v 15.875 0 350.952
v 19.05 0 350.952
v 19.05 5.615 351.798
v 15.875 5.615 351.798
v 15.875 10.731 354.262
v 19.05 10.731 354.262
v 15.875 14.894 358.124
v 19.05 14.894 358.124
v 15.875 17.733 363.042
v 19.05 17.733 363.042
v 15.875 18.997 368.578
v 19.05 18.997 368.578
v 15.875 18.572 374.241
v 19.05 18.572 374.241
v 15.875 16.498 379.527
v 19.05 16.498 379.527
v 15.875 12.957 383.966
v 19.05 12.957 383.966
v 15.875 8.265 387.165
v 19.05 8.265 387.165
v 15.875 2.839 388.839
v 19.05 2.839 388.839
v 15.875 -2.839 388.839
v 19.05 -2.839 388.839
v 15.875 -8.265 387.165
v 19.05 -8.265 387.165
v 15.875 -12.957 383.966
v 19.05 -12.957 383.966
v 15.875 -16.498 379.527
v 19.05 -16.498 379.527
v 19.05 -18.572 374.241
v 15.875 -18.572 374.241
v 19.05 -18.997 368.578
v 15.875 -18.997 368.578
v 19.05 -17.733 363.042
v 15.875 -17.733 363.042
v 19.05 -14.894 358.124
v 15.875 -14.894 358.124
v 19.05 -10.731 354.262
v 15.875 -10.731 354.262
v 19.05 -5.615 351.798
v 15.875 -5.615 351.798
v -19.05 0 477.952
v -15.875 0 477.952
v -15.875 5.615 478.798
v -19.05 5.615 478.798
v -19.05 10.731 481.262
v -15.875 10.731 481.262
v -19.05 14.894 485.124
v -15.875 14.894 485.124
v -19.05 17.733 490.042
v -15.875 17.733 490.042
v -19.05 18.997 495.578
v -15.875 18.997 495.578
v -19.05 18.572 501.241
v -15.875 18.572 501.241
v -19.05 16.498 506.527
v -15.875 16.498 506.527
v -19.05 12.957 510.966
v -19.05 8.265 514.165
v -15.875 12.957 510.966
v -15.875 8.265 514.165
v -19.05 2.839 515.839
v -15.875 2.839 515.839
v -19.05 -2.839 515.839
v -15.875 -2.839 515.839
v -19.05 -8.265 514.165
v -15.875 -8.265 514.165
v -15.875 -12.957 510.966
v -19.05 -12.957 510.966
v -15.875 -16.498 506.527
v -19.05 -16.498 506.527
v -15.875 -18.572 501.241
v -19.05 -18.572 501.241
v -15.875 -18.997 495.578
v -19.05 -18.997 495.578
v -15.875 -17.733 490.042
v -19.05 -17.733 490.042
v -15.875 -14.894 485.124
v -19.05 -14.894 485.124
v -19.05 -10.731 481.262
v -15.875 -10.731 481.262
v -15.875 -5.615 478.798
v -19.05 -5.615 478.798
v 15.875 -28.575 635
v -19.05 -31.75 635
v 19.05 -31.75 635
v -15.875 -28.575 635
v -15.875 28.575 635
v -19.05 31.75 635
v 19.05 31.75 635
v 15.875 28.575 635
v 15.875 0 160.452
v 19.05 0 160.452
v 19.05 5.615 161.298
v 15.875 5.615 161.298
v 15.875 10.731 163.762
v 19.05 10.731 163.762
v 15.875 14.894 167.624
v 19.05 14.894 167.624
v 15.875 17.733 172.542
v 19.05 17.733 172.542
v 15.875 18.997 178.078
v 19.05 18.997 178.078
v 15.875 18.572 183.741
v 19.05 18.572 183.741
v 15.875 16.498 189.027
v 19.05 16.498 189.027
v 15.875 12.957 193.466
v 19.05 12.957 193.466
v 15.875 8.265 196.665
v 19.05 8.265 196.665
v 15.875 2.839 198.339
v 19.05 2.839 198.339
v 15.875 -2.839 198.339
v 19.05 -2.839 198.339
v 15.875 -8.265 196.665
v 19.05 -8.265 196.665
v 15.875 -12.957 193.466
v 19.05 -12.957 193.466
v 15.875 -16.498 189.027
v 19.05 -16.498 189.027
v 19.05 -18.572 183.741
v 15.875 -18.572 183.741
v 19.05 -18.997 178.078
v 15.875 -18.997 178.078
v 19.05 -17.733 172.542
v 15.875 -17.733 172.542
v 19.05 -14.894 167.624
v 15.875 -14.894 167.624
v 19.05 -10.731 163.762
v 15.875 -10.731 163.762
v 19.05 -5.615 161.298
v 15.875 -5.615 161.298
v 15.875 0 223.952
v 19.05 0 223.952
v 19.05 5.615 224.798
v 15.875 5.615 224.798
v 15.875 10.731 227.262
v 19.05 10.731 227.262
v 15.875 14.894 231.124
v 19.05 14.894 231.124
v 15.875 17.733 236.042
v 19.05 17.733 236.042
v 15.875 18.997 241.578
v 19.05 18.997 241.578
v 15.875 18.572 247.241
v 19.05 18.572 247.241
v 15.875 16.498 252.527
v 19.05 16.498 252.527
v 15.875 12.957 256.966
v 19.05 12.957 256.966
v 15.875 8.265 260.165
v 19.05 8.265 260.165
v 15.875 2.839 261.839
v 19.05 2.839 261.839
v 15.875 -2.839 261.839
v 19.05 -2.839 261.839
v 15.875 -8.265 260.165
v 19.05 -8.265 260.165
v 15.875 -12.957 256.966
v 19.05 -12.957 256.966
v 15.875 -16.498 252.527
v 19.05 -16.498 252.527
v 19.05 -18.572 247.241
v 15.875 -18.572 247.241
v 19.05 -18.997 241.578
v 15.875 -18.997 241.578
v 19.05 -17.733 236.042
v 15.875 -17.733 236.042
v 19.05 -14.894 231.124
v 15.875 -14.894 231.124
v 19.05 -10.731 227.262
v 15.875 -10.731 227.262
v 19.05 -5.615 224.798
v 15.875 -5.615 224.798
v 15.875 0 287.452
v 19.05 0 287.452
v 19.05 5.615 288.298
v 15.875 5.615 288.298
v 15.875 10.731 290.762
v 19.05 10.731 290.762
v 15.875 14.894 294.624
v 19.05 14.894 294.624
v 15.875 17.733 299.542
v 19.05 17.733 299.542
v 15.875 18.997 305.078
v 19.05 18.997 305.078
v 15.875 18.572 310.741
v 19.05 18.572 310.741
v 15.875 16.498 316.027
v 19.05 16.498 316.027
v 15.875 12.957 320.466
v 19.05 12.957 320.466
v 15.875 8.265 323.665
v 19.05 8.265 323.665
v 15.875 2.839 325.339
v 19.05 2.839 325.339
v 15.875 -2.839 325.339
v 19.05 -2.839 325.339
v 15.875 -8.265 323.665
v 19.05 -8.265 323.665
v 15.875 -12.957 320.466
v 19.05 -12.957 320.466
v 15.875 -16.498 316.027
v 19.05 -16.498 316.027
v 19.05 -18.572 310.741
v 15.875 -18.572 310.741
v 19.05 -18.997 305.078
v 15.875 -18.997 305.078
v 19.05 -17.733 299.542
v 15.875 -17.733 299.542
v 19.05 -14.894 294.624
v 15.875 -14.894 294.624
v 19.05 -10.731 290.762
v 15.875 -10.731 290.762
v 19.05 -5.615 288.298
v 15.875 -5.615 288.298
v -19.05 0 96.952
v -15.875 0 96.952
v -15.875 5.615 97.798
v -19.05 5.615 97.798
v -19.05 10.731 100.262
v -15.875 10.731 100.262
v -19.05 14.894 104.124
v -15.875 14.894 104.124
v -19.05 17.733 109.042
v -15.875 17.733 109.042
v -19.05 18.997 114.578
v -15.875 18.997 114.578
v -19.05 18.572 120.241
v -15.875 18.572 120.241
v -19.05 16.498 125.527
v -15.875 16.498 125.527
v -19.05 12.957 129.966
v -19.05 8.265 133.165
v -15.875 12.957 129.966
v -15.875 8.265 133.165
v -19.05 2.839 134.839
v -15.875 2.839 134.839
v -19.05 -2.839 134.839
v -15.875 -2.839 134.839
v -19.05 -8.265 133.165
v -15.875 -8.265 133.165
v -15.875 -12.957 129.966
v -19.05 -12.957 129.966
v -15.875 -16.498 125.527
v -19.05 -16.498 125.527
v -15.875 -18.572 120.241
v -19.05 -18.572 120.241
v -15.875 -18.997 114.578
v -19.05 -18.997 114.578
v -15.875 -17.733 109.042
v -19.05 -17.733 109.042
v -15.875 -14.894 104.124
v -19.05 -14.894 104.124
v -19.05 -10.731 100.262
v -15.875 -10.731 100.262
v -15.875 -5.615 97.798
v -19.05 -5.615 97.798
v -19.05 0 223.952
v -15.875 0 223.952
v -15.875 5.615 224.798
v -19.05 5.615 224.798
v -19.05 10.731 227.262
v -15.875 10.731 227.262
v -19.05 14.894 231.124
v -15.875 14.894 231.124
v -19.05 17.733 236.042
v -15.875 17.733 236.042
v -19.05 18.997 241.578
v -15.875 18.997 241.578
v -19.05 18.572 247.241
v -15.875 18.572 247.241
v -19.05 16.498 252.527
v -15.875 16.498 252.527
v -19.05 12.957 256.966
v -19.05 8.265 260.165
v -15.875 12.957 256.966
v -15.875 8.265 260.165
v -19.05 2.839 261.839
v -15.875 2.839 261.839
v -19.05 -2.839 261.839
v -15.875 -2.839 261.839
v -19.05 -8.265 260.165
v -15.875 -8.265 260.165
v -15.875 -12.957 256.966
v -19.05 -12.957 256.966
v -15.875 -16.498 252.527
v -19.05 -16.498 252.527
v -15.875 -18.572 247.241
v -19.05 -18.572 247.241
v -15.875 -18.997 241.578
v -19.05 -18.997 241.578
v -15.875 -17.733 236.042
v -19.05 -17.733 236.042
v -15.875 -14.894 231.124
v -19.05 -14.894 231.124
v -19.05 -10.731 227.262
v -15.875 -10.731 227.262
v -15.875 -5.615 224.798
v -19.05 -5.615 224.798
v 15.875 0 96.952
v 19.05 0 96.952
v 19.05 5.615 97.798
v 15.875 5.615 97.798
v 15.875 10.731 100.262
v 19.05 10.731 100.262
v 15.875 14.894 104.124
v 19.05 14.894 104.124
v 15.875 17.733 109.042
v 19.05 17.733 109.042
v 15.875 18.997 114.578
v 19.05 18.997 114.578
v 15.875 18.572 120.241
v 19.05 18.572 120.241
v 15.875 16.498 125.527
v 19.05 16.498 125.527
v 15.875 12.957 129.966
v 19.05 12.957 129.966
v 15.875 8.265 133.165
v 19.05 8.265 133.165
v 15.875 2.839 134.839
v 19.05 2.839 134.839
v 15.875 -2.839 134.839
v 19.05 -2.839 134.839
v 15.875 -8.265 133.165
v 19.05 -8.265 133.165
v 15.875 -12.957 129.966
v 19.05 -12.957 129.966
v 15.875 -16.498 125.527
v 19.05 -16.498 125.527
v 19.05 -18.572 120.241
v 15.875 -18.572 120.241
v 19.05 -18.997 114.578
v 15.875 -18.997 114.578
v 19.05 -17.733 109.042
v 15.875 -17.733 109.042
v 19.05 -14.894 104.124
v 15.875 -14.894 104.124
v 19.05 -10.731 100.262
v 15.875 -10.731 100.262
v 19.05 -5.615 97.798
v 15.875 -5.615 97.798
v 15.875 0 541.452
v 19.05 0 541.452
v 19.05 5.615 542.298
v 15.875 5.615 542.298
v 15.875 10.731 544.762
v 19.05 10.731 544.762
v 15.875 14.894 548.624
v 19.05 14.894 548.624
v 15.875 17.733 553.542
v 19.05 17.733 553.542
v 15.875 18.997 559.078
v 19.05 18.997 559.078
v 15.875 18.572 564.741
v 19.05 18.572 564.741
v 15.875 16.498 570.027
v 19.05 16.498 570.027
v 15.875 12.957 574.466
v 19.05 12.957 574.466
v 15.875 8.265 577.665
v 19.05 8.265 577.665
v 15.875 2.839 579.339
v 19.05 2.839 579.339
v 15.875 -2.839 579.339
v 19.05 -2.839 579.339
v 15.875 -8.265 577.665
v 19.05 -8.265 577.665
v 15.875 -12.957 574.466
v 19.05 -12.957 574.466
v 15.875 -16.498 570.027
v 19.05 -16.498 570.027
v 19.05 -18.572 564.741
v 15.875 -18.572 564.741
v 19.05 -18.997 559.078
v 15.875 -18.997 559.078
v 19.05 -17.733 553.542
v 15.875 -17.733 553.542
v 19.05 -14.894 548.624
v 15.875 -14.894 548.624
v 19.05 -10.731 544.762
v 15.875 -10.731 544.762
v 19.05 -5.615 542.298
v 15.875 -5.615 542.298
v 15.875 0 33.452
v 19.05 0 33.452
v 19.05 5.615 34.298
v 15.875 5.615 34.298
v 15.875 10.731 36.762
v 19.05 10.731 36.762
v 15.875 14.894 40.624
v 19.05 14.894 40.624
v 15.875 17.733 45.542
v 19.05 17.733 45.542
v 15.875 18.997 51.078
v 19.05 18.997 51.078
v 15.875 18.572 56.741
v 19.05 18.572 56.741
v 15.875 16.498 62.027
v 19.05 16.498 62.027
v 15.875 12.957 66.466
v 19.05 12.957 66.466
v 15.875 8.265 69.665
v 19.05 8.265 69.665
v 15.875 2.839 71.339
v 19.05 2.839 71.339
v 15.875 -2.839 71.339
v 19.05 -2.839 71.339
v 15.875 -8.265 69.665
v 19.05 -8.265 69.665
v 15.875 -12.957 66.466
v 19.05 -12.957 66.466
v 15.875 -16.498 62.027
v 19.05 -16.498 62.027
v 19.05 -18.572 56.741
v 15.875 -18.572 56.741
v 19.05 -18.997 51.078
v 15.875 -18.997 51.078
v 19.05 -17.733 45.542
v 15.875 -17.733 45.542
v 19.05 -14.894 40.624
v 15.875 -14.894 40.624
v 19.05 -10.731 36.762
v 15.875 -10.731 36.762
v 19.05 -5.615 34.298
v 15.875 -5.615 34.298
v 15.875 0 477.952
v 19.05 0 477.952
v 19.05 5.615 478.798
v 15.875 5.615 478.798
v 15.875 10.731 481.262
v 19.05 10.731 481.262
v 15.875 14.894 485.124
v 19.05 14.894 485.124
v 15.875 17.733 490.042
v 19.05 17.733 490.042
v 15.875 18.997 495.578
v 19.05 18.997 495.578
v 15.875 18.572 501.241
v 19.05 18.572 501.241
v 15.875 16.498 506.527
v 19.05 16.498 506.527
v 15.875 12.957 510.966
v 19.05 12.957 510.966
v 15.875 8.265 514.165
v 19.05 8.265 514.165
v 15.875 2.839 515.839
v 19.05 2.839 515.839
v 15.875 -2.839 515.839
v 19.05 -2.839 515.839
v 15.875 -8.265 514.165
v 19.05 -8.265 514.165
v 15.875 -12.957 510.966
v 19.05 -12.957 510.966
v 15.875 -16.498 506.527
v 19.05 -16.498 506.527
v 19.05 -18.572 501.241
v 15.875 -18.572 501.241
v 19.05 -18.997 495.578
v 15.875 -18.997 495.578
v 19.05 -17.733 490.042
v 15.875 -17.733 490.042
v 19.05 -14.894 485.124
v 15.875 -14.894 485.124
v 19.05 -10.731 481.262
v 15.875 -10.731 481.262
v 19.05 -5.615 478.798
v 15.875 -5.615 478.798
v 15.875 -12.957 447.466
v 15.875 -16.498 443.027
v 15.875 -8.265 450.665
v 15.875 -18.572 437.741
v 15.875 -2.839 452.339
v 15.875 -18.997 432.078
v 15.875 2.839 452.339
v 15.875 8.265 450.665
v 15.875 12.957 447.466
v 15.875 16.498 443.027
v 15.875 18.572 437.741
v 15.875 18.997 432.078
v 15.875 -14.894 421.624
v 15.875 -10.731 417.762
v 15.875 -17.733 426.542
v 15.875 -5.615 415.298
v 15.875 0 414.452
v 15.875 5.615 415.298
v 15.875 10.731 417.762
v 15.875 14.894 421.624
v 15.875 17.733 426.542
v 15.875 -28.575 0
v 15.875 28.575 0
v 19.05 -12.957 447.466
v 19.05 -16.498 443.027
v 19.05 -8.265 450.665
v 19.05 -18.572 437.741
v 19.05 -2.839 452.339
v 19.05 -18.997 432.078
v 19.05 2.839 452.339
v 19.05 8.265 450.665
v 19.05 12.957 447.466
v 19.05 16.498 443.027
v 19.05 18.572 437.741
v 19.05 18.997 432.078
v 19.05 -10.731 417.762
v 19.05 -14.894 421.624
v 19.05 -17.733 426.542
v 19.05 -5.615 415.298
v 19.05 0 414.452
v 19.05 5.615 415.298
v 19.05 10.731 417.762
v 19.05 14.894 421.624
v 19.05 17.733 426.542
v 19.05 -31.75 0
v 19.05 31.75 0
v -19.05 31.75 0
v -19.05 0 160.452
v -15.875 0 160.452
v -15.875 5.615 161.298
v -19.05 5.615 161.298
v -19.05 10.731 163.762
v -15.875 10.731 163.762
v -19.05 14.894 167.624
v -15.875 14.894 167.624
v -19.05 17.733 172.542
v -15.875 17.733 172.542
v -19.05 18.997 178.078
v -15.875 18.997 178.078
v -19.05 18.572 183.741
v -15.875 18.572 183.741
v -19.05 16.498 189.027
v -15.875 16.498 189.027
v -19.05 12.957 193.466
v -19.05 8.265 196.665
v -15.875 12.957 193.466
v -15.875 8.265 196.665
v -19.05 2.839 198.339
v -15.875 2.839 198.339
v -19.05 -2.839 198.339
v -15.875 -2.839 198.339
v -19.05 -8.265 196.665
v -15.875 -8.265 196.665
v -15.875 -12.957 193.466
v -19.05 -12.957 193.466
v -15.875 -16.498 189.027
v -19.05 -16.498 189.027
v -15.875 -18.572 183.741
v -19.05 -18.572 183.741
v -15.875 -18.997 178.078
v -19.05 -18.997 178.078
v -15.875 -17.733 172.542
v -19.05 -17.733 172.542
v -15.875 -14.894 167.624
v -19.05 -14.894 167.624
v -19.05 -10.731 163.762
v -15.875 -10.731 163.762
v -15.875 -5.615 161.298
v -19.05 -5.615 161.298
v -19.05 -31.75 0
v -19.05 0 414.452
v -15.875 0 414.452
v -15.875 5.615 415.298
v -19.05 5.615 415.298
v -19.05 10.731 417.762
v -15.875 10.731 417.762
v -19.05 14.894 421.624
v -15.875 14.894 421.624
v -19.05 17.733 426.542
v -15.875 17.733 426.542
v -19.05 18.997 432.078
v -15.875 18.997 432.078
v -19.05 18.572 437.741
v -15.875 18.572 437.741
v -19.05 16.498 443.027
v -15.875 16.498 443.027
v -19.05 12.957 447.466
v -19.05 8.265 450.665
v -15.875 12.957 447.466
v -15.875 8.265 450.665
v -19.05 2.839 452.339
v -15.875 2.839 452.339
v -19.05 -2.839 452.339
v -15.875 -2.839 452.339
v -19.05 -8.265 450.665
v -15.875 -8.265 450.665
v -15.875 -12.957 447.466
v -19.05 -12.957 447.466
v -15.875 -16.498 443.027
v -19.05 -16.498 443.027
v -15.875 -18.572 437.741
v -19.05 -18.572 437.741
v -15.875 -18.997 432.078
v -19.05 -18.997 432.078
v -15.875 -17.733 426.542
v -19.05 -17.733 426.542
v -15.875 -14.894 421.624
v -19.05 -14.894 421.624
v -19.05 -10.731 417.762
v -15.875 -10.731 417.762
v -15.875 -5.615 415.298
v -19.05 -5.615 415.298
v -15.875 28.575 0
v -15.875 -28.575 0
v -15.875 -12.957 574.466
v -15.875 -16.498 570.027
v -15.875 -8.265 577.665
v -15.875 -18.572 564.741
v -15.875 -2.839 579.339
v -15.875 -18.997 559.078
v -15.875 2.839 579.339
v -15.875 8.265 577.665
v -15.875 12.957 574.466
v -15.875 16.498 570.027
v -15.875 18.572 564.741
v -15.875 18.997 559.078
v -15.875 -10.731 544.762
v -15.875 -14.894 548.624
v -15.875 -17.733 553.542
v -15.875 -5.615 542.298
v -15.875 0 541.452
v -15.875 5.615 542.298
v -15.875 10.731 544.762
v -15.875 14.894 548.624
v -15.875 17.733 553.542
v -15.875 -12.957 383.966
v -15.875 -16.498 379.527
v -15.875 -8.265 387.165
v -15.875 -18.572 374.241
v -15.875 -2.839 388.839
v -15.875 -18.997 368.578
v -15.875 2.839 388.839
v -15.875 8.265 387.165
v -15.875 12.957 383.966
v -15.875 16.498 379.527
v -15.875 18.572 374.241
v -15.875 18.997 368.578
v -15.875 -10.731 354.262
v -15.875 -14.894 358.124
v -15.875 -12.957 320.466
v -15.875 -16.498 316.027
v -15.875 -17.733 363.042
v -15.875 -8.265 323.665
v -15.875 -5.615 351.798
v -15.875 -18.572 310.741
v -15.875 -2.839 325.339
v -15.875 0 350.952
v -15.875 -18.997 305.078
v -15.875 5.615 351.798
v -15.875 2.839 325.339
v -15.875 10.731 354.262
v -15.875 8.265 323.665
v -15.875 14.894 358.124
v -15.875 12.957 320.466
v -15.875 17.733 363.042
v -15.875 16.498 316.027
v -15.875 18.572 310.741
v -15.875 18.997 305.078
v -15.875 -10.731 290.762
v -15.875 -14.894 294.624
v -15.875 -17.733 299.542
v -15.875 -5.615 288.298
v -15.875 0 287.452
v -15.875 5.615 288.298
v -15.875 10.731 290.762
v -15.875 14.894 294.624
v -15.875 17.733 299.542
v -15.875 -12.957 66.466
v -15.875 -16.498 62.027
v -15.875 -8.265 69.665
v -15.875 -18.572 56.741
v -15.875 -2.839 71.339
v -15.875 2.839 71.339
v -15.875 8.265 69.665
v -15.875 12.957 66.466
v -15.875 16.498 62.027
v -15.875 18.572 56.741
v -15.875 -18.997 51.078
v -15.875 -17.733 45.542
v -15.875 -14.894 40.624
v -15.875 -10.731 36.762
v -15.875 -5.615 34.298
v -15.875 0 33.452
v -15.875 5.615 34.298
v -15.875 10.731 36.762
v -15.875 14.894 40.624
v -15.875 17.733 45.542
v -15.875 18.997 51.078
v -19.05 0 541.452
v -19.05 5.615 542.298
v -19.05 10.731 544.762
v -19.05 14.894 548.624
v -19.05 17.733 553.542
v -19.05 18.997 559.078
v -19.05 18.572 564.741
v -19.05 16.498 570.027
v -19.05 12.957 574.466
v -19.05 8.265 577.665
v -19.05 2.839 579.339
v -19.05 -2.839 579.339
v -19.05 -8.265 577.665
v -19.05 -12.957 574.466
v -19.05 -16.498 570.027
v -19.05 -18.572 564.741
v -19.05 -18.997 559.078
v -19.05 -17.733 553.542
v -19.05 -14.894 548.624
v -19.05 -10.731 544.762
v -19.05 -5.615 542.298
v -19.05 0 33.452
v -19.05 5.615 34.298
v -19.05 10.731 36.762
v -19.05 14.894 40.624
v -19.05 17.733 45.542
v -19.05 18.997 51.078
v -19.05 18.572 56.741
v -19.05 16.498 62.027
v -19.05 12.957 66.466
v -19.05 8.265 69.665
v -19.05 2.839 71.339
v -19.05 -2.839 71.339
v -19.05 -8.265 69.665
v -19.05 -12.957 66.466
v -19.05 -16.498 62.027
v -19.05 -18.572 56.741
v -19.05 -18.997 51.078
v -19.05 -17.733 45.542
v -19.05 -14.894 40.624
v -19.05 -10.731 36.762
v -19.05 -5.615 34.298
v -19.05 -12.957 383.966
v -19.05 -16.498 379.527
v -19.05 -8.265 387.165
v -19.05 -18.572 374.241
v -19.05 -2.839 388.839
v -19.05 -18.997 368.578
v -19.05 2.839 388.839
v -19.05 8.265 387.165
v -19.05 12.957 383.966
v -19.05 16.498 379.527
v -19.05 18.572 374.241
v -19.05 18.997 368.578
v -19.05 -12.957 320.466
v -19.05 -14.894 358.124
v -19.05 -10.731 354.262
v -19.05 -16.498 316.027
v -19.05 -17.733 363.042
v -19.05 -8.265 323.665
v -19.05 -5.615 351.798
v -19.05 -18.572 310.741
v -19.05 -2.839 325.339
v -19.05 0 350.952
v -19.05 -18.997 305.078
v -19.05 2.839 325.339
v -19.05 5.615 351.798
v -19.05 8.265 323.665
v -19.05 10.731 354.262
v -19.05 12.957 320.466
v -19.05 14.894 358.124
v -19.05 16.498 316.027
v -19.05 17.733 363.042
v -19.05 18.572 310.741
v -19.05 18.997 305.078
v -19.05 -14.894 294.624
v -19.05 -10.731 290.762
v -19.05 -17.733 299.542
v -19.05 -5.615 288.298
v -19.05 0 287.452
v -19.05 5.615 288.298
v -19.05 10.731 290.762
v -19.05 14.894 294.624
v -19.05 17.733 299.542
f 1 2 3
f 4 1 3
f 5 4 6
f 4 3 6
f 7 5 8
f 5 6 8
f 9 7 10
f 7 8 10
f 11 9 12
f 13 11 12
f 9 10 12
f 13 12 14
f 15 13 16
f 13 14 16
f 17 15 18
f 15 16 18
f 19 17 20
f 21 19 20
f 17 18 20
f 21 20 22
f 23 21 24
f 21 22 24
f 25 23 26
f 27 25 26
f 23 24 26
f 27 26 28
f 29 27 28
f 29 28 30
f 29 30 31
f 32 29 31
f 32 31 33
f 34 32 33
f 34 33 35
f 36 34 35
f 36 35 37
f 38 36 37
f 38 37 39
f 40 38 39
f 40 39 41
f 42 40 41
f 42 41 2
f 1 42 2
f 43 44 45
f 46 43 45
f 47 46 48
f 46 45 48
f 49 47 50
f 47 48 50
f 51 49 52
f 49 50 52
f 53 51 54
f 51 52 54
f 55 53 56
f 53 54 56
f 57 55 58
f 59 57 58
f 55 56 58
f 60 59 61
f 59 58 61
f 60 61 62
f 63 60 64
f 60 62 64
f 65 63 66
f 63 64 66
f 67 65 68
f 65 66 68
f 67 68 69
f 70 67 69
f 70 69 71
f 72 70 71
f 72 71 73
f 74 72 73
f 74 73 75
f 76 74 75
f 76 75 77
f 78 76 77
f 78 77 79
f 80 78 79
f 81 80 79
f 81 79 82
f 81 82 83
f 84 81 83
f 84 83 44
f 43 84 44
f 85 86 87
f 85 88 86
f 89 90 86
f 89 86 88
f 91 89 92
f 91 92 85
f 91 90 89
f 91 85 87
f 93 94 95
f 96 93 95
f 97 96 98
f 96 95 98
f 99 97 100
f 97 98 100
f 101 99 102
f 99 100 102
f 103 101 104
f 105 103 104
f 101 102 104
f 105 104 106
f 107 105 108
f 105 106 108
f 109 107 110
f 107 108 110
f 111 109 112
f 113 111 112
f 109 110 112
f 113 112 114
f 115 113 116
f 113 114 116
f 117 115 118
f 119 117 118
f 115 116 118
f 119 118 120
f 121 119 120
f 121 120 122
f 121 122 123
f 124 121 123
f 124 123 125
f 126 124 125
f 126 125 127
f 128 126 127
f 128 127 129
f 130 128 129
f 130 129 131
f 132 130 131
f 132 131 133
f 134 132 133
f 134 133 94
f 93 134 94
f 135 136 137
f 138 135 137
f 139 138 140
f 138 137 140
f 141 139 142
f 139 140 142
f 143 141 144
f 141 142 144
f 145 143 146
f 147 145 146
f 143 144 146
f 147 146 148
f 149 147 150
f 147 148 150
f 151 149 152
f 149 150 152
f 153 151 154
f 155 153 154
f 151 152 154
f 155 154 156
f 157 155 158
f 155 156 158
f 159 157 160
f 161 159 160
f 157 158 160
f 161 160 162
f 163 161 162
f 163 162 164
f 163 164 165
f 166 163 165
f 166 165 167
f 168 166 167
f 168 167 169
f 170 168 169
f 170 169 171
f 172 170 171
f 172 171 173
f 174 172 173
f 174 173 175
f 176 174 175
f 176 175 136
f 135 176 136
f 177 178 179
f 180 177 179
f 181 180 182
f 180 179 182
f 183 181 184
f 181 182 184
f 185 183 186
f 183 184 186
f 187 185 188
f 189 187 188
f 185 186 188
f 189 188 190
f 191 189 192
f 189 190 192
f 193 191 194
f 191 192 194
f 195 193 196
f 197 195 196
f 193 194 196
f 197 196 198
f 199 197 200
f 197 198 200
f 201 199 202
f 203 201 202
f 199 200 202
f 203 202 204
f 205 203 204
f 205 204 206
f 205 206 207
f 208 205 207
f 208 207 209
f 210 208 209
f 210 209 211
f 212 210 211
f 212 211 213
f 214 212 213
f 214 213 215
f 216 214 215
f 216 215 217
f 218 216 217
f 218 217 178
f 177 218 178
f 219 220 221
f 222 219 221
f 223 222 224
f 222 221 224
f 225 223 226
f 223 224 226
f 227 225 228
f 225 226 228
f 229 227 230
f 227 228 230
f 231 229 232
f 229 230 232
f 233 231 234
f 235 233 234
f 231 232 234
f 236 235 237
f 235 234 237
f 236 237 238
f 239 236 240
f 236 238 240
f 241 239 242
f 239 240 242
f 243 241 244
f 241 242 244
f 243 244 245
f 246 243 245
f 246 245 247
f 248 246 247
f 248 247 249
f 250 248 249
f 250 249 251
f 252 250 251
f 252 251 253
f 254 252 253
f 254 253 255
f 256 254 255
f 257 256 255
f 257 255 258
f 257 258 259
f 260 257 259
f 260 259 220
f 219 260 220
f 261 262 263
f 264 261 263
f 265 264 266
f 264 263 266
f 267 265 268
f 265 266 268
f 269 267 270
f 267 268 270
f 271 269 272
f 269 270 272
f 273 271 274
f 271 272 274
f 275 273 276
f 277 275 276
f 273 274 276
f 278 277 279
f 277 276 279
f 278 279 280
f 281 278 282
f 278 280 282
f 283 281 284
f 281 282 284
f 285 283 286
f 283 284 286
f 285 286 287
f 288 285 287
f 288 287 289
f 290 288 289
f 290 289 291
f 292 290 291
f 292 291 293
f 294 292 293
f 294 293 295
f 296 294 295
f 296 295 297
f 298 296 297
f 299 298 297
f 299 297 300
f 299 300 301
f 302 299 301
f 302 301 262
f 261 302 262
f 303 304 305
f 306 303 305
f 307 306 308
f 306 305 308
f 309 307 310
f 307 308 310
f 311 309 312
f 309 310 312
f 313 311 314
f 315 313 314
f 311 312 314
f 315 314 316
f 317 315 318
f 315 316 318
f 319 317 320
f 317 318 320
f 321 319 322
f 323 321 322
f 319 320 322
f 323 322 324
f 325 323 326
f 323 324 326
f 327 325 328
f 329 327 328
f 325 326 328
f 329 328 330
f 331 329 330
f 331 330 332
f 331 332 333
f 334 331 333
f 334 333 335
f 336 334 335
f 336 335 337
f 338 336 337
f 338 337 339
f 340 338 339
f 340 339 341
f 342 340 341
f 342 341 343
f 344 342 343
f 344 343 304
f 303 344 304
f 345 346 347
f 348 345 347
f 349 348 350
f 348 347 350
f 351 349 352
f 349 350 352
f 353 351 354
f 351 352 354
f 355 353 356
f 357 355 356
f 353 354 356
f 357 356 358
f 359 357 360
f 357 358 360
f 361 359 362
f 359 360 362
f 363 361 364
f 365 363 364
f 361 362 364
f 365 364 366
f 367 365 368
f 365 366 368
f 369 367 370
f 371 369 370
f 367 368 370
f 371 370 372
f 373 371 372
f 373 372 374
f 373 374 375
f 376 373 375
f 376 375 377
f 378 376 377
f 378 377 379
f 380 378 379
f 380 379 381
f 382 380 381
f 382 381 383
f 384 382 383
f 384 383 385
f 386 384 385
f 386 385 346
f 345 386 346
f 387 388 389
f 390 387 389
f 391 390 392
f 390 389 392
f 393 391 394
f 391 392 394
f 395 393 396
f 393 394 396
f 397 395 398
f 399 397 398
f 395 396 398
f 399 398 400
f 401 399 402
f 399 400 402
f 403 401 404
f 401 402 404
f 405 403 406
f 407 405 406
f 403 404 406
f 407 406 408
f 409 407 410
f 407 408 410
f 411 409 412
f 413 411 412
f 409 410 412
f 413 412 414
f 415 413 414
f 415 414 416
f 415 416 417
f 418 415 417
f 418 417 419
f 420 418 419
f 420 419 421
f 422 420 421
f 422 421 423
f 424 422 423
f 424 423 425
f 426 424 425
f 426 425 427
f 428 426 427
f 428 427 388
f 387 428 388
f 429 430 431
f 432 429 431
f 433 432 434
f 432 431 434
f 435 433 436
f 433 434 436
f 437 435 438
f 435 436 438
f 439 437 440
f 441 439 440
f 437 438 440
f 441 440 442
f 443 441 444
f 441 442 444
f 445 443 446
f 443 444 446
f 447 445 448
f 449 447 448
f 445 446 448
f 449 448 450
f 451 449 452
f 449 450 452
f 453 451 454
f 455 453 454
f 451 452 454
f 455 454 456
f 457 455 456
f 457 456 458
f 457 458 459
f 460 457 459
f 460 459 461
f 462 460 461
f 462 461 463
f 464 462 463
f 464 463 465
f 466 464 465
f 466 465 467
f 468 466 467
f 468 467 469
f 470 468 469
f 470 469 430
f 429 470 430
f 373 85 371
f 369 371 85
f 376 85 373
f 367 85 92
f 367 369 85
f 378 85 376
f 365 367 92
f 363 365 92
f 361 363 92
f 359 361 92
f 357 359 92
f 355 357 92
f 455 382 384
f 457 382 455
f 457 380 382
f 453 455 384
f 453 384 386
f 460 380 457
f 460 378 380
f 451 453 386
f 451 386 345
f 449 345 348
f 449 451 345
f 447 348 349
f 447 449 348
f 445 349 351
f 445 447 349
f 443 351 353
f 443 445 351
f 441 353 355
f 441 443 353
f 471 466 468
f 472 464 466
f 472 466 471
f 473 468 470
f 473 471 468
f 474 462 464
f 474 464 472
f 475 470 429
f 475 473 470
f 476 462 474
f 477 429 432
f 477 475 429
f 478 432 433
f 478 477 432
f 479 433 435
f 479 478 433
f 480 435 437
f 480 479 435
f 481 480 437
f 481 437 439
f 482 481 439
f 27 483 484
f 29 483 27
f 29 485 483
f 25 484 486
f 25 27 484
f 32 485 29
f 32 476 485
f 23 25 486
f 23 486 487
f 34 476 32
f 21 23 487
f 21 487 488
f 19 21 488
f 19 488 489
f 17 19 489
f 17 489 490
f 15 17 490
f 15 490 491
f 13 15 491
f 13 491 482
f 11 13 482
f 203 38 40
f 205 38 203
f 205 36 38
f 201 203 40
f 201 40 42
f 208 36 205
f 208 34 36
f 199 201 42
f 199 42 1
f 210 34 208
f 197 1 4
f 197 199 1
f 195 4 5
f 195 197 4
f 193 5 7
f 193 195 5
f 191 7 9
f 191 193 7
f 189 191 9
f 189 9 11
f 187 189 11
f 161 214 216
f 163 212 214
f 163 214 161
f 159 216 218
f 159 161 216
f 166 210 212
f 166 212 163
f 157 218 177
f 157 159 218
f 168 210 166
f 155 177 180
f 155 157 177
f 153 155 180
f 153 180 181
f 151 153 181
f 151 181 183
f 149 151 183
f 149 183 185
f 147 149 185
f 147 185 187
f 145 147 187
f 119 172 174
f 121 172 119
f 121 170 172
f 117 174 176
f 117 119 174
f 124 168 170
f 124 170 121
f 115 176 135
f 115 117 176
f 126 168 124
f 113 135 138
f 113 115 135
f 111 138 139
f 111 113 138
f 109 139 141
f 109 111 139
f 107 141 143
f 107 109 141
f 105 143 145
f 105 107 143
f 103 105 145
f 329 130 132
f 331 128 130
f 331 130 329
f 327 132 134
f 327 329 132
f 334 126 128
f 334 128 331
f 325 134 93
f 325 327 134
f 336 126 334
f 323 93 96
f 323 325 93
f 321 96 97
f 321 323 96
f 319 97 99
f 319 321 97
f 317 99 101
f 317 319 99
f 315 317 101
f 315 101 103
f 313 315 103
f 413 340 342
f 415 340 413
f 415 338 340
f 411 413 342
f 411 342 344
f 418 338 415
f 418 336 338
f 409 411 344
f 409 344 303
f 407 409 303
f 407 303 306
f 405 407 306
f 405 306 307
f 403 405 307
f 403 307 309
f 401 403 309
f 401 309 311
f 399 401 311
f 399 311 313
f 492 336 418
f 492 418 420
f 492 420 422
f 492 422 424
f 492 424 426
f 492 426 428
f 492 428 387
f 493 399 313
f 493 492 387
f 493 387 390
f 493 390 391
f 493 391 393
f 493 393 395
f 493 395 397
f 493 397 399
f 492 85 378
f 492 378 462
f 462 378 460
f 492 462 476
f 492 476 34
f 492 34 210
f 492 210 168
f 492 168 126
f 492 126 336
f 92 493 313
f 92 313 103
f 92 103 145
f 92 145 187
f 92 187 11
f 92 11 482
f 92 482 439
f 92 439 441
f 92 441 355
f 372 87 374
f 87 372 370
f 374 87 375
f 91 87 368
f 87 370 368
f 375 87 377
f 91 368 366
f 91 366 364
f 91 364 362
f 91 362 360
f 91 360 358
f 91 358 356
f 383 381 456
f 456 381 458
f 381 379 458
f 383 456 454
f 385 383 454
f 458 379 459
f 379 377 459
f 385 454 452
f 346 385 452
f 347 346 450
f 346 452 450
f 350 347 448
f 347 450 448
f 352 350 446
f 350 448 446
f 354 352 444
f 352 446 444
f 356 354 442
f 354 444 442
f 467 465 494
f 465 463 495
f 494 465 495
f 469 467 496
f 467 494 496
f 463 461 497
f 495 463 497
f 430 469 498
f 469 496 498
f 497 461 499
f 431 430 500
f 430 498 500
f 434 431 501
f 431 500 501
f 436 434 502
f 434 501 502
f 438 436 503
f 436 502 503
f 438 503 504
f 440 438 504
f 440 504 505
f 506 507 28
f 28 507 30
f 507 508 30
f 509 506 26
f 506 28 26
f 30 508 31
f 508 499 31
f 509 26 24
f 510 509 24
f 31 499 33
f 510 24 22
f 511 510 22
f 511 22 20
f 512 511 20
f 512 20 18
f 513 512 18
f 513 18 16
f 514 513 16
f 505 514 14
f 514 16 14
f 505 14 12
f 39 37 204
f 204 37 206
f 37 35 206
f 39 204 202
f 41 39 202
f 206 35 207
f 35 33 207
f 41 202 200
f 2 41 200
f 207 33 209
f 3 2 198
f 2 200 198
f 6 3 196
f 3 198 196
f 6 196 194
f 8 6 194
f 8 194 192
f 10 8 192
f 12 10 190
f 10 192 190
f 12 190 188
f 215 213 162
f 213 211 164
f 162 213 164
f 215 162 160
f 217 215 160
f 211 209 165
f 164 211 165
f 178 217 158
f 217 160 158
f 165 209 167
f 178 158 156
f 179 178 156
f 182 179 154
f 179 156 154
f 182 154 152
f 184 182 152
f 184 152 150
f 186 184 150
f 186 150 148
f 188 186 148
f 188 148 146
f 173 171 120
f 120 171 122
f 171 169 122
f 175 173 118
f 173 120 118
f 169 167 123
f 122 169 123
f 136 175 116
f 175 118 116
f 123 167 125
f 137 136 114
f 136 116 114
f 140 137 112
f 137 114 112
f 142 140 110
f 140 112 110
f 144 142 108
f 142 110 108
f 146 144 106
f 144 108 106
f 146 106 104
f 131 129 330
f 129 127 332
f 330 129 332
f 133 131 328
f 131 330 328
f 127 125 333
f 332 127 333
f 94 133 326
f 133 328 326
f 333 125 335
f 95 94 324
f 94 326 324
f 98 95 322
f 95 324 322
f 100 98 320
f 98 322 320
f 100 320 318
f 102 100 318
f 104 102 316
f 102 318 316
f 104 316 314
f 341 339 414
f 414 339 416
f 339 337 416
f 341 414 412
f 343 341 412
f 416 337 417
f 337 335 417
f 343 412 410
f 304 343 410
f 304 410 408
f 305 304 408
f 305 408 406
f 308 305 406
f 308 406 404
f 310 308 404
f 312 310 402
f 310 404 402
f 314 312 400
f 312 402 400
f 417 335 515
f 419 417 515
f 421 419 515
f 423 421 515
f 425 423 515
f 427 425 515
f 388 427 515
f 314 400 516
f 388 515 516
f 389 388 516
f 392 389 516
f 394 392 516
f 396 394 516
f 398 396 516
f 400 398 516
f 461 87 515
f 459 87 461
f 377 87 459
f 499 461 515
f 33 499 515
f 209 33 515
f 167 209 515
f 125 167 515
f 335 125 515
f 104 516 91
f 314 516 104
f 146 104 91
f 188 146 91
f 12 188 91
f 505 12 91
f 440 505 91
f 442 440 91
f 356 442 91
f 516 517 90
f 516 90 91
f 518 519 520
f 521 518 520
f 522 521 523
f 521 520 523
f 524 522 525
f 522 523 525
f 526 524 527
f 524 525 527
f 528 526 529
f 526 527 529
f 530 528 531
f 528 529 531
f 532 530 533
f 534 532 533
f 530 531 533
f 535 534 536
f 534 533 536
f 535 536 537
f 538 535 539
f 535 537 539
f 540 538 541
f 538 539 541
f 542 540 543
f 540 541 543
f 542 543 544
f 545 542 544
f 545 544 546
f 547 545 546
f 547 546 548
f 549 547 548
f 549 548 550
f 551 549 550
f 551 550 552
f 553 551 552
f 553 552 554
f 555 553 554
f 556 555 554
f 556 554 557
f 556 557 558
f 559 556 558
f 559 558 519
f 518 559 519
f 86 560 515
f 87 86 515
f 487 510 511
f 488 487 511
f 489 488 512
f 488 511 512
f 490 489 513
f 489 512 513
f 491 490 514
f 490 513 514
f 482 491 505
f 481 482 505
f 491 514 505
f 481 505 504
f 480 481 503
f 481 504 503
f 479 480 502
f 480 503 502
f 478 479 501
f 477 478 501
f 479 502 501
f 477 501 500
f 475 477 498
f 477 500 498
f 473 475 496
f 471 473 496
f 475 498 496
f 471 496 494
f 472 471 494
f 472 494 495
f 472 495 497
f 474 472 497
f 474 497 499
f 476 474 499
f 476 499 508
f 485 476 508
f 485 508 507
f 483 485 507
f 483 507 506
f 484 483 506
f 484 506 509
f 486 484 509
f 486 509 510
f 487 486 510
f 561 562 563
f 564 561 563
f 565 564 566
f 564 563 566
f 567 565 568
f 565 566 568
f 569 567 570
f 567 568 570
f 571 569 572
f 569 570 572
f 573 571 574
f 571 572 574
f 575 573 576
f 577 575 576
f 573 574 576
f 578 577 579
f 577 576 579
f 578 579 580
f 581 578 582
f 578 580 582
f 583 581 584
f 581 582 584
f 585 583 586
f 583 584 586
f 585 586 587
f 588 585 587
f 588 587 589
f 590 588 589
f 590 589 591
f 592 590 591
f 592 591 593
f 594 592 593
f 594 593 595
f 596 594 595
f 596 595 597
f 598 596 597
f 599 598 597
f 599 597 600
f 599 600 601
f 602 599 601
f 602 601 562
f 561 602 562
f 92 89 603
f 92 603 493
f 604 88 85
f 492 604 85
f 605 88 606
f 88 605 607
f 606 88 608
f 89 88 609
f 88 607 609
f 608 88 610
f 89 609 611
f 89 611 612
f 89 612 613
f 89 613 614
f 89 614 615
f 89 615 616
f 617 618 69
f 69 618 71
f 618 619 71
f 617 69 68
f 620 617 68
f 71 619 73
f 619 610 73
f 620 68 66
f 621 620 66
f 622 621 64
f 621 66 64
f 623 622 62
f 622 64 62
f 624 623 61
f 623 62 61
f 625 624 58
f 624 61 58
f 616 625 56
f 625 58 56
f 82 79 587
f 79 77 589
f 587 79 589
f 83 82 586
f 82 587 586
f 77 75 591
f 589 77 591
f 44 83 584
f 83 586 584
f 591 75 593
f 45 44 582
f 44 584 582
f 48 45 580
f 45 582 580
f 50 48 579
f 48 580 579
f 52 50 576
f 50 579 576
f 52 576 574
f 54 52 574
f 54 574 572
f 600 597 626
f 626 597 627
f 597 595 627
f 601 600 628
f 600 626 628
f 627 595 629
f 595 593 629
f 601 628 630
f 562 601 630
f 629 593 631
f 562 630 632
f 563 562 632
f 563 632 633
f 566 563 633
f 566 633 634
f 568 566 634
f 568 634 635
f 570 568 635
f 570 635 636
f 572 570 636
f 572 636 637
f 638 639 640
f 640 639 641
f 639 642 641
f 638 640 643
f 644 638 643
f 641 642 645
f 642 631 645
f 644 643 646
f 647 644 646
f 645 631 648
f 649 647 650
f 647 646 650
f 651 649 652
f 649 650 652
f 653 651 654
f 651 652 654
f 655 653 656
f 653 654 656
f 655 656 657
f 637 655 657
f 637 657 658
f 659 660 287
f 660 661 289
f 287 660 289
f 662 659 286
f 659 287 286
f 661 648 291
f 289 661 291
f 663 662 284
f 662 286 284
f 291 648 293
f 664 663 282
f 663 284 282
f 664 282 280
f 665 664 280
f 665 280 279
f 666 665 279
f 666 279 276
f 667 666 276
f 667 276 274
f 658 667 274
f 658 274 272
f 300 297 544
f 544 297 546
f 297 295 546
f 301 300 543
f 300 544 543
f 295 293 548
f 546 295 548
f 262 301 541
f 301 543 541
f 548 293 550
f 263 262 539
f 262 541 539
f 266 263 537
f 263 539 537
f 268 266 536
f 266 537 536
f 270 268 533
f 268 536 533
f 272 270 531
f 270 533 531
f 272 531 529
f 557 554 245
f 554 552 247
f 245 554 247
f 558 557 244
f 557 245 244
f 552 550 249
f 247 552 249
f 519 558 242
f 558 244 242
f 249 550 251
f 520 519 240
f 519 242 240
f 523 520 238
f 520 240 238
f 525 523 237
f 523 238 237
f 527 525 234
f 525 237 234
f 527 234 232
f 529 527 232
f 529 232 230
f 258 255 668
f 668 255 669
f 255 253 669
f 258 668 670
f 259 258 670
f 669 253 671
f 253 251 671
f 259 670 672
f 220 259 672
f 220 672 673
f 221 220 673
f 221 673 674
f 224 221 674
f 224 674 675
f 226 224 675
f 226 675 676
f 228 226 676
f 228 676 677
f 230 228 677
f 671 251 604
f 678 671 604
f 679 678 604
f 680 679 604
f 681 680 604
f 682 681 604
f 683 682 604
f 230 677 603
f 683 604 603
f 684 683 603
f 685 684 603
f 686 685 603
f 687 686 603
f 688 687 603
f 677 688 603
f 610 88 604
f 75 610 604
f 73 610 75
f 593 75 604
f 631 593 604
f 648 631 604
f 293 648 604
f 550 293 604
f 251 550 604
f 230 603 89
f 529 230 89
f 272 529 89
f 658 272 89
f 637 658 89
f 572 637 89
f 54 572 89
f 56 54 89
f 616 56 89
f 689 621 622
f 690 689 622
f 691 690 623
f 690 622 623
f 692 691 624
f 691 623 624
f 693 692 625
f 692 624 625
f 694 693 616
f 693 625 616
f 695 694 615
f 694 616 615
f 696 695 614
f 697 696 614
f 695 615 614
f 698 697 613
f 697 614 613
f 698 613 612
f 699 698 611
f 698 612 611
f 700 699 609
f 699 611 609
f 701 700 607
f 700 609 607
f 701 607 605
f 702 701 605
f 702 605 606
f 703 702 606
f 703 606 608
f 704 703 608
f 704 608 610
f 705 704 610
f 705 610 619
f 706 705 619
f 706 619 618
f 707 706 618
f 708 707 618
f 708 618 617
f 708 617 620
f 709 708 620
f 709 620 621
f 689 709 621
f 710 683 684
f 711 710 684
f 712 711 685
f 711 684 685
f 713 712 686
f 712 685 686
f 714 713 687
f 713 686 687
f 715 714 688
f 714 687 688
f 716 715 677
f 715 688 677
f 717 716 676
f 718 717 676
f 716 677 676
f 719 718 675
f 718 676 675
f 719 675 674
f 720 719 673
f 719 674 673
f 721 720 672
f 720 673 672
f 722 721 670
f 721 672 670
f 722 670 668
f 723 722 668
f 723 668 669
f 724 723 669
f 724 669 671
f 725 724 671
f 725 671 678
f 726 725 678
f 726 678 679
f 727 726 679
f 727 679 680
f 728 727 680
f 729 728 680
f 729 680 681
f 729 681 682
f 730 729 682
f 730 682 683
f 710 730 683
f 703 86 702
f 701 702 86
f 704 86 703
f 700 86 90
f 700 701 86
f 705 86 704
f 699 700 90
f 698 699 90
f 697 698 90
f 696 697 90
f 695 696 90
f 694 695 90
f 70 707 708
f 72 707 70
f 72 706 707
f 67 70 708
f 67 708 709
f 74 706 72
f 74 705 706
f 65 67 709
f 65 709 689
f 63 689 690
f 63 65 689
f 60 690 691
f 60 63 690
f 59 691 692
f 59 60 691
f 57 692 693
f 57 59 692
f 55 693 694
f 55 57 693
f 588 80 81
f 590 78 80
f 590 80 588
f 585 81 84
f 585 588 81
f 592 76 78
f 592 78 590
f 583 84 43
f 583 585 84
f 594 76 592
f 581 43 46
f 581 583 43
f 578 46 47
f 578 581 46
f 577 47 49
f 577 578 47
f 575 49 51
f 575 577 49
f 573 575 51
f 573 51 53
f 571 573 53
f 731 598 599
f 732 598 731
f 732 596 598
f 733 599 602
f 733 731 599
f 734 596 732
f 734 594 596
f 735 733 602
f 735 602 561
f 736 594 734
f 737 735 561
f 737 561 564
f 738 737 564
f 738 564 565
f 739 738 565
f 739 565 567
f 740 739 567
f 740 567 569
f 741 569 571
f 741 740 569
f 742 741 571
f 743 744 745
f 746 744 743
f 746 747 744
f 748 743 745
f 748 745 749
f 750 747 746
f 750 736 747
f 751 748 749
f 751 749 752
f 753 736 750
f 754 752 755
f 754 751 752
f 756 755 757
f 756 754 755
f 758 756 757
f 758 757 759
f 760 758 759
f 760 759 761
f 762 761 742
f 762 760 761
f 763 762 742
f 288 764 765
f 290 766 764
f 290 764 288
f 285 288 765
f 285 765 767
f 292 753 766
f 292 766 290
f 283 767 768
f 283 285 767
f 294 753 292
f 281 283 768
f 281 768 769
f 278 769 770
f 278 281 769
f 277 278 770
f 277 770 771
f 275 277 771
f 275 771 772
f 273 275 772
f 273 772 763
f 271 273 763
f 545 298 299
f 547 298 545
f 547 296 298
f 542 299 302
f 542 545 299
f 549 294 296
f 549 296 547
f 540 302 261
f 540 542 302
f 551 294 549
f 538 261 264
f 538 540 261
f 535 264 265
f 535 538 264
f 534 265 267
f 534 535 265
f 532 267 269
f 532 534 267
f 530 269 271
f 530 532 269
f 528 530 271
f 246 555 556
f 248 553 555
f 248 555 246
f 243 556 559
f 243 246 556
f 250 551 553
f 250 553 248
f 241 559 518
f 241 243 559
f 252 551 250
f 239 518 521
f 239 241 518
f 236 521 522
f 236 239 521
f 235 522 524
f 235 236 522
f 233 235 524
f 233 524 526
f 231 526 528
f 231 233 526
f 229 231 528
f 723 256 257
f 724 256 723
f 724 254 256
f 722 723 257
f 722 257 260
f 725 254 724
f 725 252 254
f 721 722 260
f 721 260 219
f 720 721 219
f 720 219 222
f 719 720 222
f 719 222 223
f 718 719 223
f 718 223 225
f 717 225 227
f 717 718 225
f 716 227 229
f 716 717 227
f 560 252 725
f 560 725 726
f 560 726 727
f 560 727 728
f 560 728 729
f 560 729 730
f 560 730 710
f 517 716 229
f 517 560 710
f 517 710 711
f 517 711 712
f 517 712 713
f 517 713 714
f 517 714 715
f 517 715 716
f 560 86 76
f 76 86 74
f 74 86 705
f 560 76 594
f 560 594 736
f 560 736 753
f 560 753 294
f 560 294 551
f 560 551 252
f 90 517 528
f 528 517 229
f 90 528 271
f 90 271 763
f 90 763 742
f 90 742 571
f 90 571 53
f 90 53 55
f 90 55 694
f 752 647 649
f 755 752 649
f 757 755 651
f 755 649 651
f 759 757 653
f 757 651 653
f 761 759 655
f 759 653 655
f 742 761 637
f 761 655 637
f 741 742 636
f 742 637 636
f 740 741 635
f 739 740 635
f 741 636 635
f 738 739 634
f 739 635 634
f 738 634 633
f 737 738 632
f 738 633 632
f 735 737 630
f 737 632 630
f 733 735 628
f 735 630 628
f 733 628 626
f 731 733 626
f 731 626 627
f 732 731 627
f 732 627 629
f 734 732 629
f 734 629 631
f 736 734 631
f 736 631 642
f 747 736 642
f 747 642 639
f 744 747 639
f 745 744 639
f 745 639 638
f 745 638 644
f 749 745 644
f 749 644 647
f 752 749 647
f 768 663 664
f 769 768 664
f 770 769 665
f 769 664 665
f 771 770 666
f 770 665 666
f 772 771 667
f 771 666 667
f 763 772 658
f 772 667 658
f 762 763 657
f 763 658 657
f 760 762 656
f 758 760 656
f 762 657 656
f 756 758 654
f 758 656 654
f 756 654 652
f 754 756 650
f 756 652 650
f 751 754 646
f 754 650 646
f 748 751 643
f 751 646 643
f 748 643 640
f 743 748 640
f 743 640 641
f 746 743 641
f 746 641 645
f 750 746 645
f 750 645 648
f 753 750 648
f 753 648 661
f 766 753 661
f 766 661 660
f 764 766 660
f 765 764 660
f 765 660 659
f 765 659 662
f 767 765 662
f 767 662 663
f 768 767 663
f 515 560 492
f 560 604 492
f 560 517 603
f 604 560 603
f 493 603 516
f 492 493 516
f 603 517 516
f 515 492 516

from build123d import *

# Parameters (mm, degrees)
SKETCH1_W           = 38.1
SKETCH1_H           = 63.5
SKETCH1_W_2         = 31.75
SKETCH1_H_2         = 57.15
BOSS_EXTRUDE1_DEPTH = 635
CUT_EXTRUDE1_REACH  = 638.934
SKETCH2_R           = 19.05


with BuildPart() as part:
    # Sketch1 → Boss-Extrude1 (new body)
    with BuildSketch(Plane.XY):
        Rectangle(SKETCH1_W, SKETCH1_H)
        Rectangle(SKETCH1_W_2, SKETCH1_H_2, mode=Mode.SUBTRACT)
    extrude(amount=BOSS_EXTRUDE1_DEPTH)

    # Cut-Extrude1: up to this face of the body (flat: up to its plane)
    cut_extrude1_end = Plane(part.part.faces().sort_by_distance((-19.05, 0, 317.5))[0])
    # Sketch2 → Cut-Extrude1 (cut, up to the picked face)
    with BuildSketch(Plane(origin=(19.05, 0, 0), x_dir=(0, 0, -1), z_dir=(1, 0, 0)), mode=Mode.PRIVATE) as cut_extrude1_sk1:
        with Locations((-560.5018, 0)):
            Circle(SKETCH2_R)
    cut_extrude1_tool1 = split(extrude(cut_extrude1_sk1.sketch, amount=-CUT_EXTRUDE1_REACH, mode=Mode.PRIVATE), bisect_by=cut_extrude1_end, keep=Keep.BOTH, mode=Mode.PRIVATE)
    # Sketch2 → Cut-Extrude1 (cut, up to the picked face)
    with BuildSketch(Plane(origin=(19.05, 0, 0), x_dir=(0, 0, -1), z_dir=(1, 0, 0)), mode=Mode.PRIVATE) as cut_extrude1_sk2:
        with Locations((-497.0018, 0)):
            Circle(SKETCH2_R)
    cut_extrude1_tool2 = split(extrude(cut_extrude1_sk2.sketch, amount=-CUT_EXTRUDE1_REACH, mode=Mode.PRIVATE), bisect_by=cut_extrude1_end, keep=Keep.BOTH, mode=Mode.PRIVATE)
    # Sketch2 → Cut-Extrude1 (cut, up to the picked face)
    with BuildSketch(Plane(origin=(19.05, 0, 0), x_dir=(0, 0, -1), z_dir=(1, 0, 0)), mode=Mode.PRIVATE) as cut_extrude1_sk3:
        with Locations((-433.5018, 0)):
            Circle(SKETCH2_R)
    cut_extrude1_tool3 = split(extrude(cut_extrude1_sk3.sketch, amount=-CUT_EXTRUDE1_REACH, mode=Mode.PRIVATE), bisect_by=cut_extrude1_end, keep=Keep.BOTH, mode=Mode.PRIVATE)
    # Sketch2 → Cut-Extrude1 (cut, up to the picked face)
    with BuildSketch(Plane(origin=(19.05, 0, 0), x_dir=(0, 0, -1), z_dir=(1, 0, 0)), mode=Mode.PRIVATE) as cut_extrude1_sk4:
        with Locations((-370.0018, 0)):
            Circle(SKETCH2_R)
    cut_extrude1_tool4 = split(extrude(cut_extrude1_sk4.sketch, amount=-CUT_EXTRUDE1_REACH, mode=Mode.PRIVATE), bisect_by=cut_extrude1_end, keep=Keep.BOTH, mode=Mode.PRIVATE)
    # Sketch2 → Cut-Extrude1 (cut, up to the picked face)
    with BuildSketch(Plane(origin=(19.05, 0, 0), x_dir=(0, 0, -1), z_dir=(1, 0, 0)), mode=Mode.PRIVATE) as cut_extrude1_sk5:
        with Locations((-306.5018, 0)):
            Circle(SKETCH2_R)
    cut_extrude1_tool5 = split(extrude(cut_extrude1_sk5.sketch, amount=-CUT_EXTRUDE1_REACH, mode=Mode.PRIVATE), bisect_by=cut_extrude1_end, keep=Keep.BOTH, mode=Mode.PRIVATE)
    # Sketch2 → Cut-Extrude1 (cut, up to the picked face)
    with BuildSketch(Plane(origin=(19.05, 0, 0), x_dir=(0, 0, -1), z_dir=(1, 0, 0)), mode=Mode.PRIVATE) as cut_extrude1_sk6:
        with Locations((-243.0018, 0)):
            Circle(SKETCH2_R)
    cut_extrude1_tool6 = split(extrude(cut_extrude1_sk6.sketch, amount=-CUT_EXTRUDE1_REACH, mode=Mode.PRIVATE), bisect_by=cut_extrude1_end, keep=Keep.BOTH, mode=Mode.PRIVATE)
    # Sketch2 → Cut-Extrude1 (cut, up to the picked face)
    with BuildSketch(Plane(origin=(19.05, 0, 0), x_dir=(0, 0, -1), z_dir=(1, 0, 0)), mode=Mode.PRIVATE) as cut_extrude1_sk7:
        with Locations((-179.5018, 0)):
            Circle(SKETCH2_R)
    cut_extrude1_tool7 = split(extrude(cut_extrude1_sk7.sketch, amount=-CUT_EXTRUDE1_REACH, mode=Mode.PRIVATE), bisect_by=cut_extrude1_end, keep=Keep.BOTH, mode=Mode.PRIVATE)
    # Sketch2 → Cut-Extrude1 (cut, up to the picked face)
    with BuildSketch(Plane(origin=(19.05, 0, 0), x_dir=(0, 0, -1), z_dir=(1, 0, 0)), mode=Mode.PRIVATE) as cut_extrude1_sk8:
        with Locations((-116.0018, 0)):
            Circle(SKETCH2_R)
    cut_extrude1_tool8 = split(extrude(cut_extrude1_sk8.sketch, amount=-CUT_EXTRUDE1_REACH, mode=Mode.PRIVATE), bisect_by=cut_extrude1_end, keep=Keep.BOTH, mode=Mode.PRIVATE)
    # Sketch2 → Cut-Extrude1 (cut, up to the picked face)
    with BuildSketch(Plane(origin=(19.05, 0, 0), x_dir=(0, 0, -1), z_dir=(1, 0, 0)), mode=Mode.PRIVATE) as cut_extrude1_sk9:
        with Locations((-52.5018, 0)):
            Circle(SKETCH2_R)
    cut_extrude1_tool9 = split(extrude(cut_extrude1_sk9.sketch, amount=-CUT_EXTRUDE1_REACH, mode=Mode.PRIVATE), bisect_by=cut_extrude1_end, keep=Keep.BOTH, mode=Mode.PRIVATE)
    add(cut_extrude1_tool1.solids().sort_by(Axis((19.05, 0, 560.5018), (-1, 0, 0)))[0], mode=Mode.SUBTRACT)
    add(cut_extrude1_tool2.solids().sort_by(Axis((19.05, 0, 497.0018), (-1, 0, 0)))[0], mode=Mode.SUBTRACT)
    add(cut_extrude1_tool3.solids().sort_by(Axis((19.05, 0, 433.5018), (-1, 0, 0)))[0], mode=Mode.SUBTRACT)
    add(cut_extrude1_tool4.solids().sort_by(Axis((19.05, 0, 370.0018), (-1, 0, 0)))[0], mode=Mode.SUBTRACT)
    add(cut_extrude1_tool5.solids().sort_by(Axis((19.05, 0, 306.5018), (-1, 0, 0)))[0], mode=Mode.SUBTRACT)
    add(cut_extrude1_tool6.solids().sort_by(Axis((19.05, 0, 243.0018), (-1, 0, 0)))[0], mode=Mode.SUBTRACT)
    add(cut_extrude1_tool7.solids().sort_by(Axis((19.05, 0, 179.5018), (-1, 0, 0)))[0], mode=Mode.SUBTRACT)
    add(cut_extrude1_tool8.solids().sort_by(Axis((19.05, 0, 116.0018), (-1, 0, 0)))[0], mode=Mode.SUBTRACT)
    add(cut_extrude1_tool9.solids().sort_by(Axis((19.05, 0, 52.5018), (-1, 0, 0)))[0], mode=Mode.SUBTRACT)


solid = part.part
